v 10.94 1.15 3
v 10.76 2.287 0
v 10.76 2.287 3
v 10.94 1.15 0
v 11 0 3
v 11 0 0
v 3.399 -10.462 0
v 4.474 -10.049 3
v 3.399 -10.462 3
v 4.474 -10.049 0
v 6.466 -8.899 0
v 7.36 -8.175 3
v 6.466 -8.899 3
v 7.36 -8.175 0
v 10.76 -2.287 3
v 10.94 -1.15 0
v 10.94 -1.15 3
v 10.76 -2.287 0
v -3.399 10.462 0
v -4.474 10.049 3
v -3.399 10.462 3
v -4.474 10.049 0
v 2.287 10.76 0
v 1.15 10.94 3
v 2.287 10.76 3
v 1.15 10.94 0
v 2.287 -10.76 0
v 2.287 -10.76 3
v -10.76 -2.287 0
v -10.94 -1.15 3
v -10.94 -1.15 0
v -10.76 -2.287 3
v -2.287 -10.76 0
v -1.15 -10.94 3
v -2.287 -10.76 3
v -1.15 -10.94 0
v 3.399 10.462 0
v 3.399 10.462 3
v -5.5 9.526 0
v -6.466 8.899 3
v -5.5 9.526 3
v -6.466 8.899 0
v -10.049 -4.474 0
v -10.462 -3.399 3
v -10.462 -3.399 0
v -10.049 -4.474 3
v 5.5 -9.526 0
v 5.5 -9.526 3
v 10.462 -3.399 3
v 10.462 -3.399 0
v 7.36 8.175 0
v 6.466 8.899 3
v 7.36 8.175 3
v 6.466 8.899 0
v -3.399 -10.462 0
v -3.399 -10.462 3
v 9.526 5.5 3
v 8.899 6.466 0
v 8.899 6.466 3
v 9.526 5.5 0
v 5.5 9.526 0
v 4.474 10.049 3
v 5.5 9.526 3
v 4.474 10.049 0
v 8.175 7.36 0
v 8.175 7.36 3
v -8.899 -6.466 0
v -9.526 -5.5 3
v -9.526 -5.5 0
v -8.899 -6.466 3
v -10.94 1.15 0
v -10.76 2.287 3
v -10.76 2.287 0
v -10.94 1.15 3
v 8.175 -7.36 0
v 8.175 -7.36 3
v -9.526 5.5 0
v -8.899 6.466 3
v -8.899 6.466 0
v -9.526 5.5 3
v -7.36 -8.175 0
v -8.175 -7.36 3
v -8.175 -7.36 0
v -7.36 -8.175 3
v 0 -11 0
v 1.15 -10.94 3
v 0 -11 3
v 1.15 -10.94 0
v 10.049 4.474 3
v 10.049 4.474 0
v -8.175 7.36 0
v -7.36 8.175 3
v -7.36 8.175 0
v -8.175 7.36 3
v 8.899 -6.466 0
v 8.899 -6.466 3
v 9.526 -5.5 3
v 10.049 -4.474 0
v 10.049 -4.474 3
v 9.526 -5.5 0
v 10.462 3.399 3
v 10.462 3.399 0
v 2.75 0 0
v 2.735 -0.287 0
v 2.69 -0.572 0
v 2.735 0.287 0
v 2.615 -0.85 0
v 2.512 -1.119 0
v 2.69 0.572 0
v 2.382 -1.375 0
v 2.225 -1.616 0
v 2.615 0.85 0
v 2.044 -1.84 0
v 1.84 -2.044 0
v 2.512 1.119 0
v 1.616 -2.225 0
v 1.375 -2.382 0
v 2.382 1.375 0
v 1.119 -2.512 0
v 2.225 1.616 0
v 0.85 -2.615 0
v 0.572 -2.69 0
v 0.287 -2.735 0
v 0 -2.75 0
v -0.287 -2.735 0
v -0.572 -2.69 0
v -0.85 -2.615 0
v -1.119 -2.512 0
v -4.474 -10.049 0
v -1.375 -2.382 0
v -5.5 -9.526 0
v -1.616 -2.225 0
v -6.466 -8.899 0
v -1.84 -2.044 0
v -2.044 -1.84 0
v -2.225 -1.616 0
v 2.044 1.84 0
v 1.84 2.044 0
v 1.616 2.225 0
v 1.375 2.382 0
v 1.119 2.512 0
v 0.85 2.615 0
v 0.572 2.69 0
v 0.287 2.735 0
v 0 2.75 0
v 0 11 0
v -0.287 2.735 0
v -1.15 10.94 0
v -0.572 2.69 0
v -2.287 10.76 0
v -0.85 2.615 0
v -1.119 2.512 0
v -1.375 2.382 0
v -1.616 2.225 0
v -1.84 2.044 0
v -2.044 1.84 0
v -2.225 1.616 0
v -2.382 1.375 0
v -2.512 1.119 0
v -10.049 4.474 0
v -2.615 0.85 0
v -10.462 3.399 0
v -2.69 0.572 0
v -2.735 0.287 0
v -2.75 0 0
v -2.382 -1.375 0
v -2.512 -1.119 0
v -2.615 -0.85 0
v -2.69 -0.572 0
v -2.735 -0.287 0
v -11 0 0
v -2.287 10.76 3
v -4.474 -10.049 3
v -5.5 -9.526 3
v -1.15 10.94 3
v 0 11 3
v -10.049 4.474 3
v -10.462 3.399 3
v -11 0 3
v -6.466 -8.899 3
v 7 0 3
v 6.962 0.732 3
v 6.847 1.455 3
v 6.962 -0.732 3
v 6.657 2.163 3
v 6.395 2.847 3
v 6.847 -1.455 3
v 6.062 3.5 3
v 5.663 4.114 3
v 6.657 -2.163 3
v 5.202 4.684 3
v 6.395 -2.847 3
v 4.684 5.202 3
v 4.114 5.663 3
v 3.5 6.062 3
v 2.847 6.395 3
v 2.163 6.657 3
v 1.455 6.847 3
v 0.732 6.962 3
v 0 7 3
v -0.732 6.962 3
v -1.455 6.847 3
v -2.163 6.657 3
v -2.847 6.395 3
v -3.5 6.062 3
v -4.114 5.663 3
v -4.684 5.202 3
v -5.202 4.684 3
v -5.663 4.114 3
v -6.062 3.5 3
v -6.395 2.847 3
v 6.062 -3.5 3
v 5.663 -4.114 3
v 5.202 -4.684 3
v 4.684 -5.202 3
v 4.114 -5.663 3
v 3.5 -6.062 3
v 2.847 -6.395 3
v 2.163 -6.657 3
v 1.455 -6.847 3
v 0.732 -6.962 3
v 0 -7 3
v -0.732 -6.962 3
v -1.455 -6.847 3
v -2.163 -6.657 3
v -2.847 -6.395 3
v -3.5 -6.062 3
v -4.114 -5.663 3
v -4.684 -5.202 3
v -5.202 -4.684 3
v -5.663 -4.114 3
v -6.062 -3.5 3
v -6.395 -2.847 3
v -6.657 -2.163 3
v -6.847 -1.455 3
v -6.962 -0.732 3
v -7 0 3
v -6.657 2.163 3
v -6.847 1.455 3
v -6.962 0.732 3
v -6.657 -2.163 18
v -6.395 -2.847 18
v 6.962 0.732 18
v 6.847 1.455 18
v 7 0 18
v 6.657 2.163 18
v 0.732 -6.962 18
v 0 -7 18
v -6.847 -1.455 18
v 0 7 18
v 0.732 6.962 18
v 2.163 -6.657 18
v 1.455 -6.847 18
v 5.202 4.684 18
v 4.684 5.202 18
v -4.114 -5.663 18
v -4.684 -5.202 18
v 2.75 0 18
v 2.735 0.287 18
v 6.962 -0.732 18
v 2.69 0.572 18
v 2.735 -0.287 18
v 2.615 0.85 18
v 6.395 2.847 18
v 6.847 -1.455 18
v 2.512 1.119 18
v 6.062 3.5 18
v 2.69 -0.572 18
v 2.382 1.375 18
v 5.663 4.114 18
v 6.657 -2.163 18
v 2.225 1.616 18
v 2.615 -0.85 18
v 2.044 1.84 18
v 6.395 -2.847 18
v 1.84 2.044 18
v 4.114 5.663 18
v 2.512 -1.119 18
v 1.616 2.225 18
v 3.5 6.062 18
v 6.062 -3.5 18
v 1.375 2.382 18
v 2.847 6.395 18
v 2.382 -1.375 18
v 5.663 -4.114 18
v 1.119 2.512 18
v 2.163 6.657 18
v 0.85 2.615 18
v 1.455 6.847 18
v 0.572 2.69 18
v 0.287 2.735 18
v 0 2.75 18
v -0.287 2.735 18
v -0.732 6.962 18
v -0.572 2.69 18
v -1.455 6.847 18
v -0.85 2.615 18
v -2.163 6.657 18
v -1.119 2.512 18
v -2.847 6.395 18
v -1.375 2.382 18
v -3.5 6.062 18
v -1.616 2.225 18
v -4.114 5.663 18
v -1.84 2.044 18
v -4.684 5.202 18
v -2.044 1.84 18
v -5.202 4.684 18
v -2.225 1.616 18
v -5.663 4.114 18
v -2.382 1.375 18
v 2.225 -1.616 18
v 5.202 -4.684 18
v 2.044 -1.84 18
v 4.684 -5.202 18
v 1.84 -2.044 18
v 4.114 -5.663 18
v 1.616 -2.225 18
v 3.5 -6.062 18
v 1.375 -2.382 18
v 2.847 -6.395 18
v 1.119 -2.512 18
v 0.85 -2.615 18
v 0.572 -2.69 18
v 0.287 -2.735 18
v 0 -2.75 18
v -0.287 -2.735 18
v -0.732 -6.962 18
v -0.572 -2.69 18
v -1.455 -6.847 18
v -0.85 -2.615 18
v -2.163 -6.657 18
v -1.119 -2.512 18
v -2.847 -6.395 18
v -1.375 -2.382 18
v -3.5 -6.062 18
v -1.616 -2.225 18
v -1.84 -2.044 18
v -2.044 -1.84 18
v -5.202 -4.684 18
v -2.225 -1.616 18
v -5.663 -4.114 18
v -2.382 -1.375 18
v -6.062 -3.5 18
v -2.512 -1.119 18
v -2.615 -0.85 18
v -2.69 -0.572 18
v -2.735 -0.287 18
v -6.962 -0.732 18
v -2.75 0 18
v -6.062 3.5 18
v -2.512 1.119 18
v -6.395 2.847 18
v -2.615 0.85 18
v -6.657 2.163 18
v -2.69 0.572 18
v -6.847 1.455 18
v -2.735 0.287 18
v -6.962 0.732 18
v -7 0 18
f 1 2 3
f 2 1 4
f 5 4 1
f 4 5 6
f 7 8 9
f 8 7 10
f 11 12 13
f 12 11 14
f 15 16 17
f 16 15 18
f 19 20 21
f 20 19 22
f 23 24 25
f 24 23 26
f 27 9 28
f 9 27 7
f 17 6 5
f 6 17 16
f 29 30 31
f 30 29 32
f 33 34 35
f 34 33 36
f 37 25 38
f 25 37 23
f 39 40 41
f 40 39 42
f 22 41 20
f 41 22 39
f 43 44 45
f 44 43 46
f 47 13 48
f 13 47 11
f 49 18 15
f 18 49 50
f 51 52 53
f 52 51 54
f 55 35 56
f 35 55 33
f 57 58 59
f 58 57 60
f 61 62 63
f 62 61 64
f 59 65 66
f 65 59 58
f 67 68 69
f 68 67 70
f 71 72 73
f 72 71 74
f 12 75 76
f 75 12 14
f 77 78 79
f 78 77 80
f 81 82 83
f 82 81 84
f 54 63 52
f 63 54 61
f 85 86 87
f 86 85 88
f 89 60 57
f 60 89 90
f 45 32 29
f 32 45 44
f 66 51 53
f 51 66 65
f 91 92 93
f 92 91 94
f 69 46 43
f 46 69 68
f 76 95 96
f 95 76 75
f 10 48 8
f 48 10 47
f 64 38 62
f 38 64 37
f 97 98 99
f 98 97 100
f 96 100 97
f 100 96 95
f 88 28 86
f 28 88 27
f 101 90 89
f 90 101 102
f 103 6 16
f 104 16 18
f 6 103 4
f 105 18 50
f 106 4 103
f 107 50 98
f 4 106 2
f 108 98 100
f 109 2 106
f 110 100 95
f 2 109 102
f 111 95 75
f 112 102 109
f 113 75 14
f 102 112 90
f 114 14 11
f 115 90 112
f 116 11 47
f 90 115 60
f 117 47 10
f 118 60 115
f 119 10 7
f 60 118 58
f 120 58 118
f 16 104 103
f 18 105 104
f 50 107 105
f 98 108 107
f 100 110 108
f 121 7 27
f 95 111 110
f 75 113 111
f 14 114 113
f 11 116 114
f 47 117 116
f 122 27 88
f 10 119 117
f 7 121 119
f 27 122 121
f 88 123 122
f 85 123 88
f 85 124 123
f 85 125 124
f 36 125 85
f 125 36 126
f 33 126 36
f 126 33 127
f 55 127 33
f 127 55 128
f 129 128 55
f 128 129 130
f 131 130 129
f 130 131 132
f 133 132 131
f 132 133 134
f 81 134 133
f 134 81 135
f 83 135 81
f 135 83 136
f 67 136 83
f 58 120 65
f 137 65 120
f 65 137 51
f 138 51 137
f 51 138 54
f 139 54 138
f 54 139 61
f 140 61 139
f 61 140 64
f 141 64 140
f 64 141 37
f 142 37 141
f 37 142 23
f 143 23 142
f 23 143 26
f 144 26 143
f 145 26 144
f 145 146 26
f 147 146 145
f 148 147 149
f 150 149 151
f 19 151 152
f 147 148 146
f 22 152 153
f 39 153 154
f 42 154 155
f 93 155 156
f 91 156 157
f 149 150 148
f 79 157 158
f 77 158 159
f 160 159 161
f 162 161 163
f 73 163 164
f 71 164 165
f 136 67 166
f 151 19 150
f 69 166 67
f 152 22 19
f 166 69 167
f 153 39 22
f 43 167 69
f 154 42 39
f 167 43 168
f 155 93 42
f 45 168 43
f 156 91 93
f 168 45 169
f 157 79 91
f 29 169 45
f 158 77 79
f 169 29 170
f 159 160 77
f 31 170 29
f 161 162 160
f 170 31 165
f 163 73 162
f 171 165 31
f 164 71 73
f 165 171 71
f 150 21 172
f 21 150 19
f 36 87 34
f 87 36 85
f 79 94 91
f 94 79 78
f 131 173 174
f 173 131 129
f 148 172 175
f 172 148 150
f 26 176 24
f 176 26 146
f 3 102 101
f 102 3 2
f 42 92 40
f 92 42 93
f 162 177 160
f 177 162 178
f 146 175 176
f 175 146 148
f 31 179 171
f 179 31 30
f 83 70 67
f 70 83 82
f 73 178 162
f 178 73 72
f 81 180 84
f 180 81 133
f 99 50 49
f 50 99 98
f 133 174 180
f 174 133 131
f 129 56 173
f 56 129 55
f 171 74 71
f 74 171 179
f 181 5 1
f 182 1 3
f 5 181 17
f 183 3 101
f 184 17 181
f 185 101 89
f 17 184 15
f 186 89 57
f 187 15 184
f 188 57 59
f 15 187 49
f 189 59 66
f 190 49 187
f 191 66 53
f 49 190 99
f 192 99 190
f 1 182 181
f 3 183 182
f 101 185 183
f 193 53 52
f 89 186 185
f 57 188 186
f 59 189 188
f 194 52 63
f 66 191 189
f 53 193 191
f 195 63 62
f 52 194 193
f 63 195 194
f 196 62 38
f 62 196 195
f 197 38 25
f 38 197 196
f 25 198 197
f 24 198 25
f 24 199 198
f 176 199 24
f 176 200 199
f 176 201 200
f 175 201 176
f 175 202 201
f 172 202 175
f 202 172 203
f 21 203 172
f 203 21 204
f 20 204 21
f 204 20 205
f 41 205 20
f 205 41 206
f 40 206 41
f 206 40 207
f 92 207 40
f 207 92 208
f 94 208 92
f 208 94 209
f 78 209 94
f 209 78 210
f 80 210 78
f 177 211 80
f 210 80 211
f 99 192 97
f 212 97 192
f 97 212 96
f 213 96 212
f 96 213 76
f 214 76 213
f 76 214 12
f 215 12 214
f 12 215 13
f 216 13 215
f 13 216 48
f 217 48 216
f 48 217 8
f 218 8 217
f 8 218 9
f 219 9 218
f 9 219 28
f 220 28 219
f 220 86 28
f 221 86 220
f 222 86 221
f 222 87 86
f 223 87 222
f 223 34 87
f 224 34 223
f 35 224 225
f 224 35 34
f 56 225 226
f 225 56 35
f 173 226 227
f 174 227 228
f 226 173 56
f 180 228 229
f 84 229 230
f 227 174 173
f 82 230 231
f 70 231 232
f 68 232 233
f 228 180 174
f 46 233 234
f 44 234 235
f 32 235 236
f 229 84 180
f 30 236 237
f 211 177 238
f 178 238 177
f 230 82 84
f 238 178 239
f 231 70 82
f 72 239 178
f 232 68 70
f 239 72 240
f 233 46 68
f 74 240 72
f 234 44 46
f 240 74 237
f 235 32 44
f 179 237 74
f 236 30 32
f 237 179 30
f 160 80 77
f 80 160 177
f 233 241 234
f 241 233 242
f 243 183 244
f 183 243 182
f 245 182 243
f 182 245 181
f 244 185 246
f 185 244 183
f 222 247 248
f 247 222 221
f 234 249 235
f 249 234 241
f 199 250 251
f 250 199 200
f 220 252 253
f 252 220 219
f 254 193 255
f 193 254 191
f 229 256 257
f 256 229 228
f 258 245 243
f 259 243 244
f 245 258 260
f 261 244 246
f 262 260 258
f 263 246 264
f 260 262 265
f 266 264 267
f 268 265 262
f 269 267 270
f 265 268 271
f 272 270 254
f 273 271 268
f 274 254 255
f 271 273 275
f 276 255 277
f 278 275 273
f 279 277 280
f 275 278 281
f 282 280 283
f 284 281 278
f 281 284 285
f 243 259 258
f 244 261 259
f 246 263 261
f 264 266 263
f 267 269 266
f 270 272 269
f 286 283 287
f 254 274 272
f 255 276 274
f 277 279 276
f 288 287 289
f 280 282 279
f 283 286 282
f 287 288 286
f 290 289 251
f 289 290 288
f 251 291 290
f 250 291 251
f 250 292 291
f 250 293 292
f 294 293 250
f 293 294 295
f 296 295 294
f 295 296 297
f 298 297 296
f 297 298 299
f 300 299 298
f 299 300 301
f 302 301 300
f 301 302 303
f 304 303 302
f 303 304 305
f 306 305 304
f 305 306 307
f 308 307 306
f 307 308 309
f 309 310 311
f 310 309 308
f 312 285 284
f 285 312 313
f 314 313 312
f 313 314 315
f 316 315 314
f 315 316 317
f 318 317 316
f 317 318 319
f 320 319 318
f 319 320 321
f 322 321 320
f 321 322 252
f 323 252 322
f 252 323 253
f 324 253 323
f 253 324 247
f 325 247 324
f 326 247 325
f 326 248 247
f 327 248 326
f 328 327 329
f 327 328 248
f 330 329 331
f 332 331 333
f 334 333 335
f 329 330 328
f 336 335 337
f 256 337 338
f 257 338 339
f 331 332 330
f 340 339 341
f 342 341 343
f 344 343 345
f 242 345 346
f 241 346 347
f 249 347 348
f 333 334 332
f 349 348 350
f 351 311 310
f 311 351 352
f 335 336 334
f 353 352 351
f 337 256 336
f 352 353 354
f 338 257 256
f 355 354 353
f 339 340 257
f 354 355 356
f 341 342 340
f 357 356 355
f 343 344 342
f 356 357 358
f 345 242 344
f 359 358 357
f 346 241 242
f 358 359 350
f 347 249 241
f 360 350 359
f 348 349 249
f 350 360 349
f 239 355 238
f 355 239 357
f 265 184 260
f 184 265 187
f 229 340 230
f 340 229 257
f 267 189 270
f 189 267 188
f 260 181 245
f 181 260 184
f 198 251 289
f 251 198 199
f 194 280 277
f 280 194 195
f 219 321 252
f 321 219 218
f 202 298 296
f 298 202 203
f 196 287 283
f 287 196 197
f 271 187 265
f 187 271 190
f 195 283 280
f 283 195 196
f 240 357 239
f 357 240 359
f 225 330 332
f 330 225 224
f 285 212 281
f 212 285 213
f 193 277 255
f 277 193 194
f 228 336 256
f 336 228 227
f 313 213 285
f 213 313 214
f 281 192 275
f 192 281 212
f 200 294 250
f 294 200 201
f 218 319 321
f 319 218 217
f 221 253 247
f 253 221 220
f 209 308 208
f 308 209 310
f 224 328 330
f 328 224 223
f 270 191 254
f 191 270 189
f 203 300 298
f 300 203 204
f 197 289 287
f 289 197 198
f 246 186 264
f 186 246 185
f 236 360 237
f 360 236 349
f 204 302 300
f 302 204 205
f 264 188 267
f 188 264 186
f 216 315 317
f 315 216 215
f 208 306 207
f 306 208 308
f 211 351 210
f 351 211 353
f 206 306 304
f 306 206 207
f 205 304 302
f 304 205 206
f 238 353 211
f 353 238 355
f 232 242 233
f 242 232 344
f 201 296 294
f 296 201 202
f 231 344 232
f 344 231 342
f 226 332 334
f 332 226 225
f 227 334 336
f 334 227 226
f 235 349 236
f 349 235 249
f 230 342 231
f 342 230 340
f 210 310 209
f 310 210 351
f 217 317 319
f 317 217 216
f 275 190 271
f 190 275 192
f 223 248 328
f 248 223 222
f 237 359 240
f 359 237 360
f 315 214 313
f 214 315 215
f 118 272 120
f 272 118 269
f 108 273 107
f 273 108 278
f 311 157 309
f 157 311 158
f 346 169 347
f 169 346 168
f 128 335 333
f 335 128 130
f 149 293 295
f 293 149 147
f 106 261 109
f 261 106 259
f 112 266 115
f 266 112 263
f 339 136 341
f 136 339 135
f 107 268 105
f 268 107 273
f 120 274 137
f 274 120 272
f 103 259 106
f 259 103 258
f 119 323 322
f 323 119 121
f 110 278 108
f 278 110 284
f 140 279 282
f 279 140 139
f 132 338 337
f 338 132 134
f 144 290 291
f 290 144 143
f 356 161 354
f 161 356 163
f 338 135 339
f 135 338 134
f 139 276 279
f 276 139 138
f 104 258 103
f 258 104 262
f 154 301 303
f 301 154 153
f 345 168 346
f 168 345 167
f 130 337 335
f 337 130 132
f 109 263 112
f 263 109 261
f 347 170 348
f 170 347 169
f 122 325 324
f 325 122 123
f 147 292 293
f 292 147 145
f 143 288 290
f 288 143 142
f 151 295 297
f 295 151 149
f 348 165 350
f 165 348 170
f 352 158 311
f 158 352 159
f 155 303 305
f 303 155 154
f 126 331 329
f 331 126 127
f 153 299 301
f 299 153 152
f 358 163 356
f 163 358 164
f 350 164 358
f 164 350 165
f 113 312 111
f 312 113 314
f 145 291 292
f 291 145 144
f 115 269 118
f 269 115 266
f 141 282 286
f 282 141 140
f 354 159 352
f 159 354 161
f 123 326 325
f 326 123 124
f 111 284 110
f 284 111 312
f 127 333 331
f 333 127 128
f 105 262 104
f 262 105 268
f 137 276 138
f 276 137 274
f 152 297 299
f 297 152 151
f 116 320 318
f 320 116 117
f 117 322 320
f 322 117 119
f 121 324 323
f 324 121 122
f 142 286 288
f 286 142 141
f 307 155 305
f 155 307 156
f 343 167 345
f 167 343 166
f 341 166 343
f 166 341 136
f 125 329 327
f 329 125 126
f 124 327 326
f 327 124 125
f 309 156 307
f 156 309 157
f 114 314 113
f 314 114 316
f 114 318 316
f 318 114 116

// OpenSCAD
// Cable gland body for 5 mm cable.
$fn = 60;
eps = 0.02;
cable_d = 5;
body_d = 14;
body_l = 18;
flange_d = body_d + 8;
flange_t = 3;
difference() {
    union() { cylinder(d = flange_d, h = flange_t); cylinder(d = body_d, h = body_l); }
    translate([0, 0, -eps]) cylinder(d = cable_d + 0.5, h = body_l + 2 * eps);
}
